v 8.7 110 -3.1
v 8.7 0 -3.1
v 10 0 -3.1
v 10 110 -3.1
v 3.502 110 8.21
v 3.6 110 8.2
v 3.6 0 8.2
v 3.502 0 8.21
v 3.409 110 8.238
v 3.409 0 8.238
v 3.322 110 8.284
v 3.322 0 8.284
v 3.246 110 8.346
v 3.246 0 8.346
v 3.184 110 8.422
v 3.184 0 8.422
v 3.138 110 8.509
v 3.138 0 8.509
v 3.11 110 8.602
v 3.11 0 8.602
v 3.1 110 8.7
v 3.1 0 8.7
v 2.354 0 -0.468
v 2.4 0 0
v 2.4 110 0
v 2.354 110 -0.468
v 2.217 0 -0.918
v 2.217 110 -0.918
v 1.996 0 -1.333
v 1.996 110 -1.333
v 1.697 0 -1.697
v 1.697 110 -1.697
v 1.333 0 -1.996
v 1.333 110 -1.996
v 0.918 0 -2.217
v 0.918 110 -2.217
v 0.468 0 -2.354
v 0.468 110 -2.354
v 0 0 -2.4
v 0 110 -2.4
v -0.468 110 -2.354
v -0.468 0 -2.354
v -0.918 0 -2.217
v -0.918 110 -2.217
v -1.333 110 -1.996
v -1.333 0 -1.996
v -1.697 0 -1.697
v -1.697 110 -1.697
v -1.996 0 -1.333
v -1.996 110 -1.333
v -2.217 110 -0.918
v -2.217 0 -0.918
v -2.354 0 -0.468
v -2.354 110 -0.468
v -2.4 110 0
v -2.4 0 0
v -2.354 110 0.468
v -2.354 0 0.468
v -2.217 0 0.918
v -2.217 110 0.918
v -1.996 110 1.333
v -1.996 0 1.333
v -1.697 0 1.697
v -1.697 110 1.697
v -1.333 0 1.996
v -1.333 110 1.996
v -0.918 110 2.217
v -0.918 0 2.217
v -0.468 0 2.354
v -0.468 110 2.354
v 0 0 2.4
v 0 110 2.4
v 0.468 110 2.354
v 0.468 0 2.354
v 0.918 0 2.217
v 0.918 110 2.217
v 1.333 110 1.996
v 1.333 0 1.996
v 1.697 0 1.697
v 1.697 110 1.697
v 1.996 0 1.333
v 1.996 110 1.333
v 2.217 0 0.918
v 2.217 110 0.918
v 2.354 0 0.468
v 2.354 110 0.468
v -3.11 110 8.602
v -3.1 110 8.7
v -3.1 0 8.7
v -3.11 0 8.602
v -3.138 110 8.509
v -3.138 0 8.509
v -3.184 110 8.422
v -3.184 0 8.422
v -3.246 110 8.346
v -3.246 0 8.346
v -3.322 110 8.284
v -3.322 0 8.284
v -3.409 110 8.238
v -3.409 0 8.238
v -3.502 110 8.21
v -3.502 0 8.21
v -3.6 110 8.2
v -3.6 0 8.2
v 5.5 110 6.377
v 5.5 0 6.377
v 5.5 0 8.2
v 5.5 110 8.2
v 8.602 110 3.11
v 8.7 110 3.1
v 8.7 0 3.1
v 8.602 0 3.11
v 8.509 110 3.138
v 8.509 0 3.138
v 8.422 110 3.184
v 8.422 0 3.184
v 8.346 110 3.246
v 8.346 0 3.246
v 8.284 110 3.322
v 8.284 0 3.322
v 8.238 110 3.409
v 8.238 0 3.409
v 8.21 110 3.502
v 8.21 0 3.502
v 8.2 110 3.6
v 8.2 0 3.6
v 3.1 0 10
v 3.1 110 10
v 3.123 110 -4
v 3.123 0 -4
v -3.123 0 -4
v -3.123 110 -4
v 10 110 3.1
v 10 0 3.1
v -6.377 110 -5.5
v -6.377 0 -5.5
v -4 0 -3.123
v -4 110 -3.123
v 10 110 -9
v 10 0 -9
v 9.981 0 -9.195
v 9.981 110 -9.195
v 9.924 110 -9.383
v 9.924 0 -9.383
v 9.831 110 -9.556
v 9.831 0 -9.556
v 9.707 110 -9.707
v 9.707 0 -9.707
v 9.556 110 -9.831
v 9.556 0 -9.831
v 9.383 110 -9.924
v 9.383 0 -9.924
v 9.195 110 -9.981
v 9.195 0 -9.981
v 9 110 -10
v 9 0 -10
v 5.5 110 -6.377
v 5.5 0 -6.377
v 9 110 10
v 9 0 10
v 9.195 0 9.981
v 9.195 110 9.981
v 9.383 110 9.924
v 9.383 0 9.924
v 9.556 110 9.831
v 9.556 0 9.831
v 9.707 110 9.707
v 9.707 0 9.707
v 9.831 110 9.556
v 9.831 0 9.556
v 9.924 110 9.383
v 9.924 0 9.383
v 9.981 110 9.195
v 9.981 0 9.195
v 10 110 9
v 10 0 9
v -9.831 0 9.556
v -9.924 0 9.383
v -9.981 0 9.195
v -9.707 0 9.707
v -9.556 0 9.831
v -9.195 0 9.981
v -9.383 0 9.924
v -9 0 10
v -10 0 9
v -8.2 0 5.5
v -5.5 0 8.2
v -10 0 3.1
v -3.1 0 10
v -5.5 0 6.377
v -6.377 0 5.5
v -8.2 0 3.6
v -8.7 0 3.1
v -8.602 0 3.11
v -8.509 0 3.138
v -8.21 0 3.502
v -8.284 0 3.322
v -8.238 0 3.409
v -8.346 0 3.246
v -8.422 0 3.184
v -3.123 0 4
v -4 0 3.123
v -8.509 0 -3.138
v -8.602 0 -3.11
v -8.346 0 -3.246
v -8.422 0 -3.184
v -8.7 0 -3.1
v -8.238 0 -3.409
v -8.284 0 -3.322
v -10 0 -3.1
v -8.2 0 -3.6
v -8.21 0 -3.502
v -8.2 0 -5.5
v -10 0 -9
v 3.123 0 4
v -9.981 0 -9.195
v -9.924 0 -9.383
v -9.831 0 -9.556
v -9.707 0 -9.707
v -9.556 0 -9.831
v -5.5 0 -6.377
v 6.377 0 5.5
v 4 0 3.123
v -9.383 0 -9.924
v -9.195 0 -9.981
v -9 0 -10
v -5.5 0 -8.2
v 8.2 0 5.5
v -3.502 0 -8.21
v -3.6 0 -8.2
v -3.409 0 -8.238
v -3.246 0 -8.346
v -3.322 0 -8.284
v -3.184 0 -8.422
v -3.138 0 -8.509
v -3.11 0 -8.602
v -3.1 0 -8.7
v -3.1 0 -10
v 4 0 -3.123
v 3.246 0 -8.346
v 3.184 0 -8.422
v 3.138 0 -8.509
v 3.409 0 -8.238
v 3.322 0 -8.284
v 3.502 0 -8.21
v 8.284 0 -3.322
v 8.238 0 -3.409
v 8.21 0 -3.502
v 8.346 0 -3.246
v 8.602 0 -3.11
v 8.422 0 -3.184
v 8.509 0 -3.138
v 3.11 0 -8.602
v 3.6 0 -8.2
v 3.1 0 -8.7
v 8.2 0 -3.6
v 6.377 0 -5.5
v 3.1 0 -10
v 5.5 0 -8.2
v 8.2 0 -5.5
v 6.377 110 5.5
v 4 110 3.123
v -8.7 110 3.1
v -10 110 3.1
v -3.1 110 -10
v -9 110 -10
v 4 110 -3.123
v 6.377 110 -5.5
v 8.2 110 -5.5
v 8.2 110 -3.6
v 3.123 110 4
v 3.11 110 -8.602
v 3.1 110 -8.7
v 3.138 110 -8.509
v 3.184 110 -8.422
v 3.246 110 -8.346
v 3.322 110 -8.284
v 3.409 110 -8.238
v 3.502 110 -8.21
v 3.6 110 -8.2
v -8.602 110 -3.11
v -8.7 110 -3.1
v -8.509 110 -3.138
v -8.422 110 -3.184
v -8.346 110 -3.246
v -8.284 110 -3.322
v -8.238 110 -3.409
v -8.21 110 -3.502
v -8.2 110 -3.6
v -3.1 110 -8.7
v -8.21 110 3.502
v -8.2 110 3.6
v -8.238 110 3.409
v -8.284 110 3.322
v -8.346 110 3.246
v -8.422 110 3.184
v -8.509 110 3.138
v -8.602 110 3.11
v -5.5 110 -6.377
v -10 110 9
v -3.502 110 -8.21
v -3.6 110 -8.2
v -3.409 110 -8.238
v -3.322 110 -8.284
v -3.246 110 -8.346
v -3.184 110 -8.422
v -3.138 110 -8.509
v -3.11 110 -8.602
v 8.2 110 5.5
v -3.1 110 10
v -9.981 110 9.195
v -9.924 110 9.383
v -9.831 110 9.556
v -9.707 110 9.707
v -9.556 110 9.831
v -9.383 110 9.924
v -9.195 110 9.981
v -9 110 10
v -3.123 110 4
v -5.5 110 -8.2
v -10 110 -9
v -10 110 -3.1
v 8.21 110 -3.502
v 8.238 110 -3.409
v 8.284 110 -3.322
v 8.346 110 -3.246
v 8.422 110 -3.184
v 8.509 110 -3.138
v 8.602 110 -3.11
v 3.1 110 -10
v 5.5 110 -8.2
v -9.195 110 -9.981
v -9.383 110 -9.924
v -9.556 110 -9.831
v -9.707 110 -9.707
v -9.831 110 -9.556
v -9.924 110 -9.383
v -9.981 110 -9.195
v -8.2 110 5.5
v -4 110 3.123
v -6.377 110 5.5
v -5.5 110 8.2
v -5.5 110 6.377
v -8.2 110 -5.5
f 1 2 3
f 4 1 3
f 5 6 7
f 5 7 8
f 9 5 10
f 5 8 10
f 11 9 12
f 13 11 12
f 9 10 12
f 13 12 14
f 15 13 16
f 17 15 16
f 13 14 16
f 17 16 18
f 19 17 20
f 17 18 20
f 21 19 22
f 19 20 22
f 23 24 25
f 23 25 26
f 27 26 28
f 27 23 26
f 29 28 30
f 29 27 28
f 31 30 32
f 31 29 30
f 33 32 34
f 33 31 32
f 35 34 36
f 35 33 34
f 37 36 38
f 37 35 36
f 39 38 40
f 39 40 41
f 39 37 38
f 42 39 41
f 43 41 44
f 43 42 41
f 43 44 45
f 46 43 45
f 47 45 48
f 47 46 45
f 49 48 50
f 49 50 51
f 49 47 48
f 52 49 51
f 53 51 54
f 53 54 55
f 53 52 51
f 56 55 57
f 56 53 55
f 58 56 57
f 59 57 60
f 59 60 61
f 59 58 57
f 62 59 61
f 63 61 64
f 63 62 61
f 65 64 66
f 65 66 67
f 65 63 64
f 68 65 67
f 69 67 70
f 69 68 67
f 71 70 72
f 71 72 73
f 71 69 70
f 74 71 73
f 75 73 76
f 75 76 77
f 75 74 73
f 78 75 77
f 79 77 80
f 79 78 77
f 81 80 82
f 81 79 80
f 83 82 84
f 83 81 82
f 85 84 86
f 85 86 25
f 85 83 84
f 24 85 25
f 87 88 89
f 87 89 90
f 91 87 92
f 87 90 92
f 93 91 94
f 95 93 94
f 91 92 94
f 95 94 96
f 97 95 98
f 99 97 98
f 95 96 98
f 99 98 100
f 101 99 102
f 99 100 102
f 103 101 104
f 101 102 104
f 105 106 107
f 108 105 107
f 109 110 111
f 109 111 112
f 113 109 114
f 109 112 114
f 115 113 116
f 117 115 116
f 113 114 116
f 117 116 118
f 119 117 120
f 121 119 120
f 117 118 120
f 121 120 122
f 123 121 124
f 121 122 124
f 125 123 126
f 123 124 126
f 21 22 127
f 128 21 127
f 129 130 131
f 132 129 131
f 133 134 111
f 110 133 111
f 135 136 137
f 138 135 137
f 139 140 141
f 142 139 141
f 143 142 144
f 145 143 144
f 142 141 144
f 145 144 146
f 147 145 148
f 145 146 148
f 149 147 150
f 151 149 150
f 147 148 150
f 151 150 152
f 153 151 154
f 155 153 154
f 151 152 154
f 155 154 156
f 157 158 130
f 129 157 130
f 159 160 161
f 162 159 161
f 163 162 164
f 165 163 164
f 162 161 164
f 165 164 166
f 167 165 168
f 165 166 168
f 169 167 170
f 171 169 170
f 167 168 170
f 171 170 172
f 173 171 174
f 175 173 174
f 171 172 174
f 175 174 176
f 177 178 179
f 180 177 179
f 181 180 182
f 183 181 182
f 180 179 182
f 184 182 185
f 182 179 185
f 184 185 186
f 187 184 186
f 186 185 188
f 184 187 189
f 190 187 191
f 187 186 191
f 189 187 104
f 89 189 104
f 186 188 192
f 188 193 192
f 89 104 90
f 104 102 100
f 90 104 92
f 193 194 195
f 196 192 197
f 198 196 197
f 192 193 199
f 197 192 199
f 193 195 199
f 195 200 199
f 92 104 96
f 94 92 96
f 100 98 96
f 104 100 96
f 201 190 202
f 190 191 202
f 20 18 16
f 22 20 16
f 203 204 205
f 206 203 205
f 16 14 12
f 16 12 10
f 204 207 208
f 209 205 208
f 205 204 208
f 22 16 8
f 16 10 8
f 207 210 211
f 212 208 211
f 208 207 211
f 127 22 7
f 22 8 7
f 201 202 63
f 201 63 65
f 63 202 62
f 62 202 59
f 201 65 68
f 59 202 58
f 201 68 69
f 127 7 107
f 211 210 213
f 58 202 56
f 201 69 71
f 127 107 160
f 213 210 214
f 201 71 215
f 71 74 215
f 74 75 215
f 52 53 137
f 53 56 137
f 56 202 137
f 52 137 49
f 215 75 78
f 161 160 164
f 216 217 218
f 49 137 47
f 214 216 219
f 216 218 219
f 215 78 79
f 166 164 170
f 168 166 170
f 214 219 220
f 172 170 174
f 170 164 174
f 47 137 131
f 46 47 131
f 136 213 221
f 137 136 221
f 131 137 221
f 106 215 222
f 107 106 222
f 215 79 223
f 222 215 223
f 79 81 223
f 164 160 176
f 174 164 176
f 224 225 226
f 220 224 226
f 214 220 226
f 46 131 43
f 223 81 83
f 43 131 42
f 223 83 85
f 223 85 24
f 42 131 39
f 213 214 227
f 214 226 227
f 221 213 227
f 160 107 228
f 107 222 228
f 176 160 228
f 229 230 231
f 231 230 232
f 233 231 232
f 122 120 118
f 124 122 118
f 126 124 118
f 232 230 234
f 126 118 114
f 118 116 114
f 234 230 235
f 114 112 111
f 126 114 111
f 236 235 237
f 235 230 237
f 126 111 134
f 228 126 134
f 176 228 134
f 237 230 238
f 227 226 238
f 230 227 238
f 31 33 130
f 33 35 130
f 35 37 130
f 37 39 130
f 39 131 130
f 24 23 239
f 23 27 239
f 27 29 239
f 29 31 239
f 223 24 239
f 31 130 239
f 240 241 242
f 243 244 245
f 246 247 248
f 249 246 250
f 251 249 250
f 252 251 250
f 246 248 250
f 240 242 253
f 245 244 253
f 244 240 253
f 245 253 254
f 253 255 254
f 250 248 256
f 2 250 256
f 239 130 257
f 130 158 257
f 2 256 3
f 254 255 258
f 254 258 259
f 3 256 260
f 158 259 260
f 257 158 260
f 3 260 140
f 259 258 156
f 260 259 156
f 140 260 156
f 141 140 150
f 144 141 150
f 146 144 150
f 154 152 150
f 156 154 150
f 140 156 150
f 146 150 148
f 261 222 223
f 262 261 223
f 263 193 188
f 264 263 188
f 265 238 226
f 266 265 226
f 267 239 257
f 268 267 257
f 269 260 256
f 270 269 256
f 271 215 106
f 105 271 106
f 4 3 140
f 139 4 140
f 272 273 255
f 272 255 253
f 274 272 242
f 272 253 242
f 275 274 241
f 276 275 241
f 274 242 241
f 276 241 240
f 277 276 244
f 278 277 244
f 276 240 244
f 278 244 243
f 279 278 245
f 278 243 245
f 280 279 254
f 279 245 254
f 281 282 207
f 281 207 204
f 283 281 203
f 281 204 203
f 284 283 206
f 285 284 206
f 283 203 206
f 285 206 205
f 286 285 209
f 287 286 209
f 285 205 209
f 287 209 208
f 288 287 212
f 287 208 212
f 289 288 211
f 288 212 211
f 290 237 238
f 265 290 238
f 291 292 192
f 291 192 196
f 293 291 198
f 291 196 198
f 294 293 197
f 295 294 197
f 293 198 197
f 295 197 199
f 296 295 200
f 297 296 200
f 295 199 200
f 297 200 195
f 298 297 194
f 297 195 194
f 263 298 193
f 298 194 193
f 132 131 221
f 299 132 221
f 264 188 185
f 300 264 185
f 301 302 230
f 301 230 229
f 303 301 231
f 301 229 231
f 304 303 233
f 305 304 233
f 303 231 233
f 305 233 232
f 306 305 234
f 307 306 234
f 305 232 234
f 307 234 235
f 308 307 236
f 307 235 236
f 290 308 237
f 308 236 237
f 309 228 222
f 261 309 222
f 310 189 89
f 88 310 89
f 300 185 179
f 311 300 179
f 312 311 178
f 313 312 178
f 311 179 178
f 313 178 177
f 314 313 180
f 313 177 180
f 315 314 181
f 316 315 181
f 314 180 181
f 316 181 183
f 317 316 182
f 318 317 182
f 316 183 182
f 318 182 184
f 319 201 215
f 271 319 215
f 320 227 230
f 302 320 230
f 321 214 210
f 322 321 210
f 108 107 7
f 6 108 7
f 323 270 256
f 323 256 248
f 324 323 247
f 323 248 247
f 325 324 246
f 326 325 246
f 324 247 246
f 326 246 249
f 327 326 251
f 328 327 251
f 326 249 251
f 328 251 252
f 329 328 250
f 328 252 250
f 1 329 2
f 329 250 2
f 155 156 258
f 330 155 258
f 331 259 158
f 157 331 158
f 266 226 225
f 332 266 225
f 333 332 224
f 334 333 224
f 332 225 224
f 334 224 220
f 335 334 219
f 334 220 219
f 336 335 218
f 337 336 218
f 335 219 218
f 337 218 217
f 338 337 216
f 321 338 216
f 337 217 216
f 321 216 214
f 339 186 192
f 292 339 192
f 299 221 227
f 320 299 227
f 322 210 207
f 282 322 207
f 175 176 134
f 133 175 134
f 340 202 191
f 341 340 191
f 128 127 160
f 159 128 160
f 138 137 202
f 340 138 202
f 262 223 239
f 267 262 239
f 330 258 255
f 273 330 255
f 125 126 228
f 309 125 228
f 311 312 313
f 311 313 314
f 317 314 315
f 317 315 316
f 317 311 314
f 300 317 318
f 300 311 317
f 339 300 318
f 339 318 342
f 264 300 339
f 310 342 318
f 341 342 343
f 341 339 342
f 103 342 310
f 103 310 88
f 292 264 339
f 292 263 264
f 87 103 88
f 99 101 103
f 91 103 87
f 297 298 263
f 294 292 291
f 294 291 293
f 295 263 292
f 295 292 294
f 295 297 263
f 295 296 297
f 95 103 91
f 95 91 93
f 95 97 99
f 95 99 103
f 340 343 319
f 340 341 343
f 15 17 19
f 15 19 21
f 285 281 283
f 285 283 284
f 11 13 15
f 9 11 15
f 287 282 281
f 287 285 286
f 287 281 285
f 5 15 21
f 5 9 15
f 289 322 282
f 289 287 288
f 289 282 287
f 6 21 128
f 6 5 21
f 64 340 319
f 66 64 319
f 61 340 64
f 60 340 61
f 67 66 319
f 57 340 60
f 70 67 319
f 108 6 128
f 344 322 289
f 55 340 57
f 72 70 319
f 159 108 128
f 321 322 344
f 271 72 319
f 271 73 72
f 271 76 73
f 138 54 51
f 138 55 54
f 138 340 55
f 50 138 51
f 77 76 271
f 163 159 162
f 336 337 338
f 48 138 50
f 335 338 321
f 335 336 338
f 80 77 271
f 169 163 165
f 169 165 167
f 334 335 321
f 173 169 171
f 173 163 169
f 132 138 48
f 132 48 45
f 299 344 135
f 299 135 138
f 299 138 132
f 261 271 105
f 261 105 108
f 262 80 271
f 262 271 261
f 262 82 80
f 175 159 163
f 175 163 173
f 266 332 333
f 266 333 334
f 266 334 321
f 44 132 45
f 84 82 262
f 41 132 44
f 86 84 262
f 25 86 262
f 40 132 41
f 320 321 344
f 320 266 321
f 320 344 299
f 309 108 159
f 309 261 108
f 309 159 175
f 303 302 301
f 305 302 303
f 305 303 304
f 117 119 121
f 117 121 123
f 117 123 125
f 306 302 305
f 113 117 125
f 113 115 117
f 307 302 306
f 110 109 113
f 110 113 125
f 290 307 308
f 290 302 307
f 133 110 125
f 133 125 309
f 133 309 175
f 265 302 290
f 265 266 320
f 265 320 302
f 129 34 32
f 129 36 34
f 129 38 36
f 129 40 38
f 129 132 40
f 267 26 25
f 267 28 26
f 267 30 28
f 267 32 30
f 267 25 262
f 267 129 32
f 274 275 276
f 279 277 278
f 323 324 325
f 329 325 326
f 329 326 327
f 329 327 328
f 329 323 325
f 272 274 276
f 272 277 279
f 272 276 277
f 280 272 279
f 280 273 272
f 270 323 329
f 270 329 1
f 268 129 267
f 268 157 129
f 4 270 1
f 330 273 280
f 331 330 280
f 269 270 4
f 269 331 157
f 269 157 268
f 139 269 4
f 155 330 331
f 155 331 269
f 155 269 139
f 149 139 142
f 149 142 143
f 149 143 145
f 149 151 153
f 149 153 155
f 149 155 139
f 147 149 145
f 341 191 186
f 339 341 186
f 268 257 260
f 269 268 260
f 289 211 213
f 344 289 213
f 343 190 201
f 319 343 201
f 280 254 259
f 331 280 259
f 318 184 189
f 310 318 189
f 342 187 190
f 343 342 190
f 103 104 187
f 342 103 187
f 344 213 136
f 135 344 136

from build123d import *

# Parameters (mm, degrees)
SKETCH1_R           = 2.4
BOSS_EXTRUDE1_DEPTH = 110


with BuildPart() as part:
    # Sketch1 → Boss-Extrude1 (new body)
    with BuildSketch(Plane(origin=(0, 0, 0), x_dir=(1, 0, 0), z_dir=(0, 1, 0))):
        with BuildLine():
            ThreePointArc((-10, -9), (-9.707106781, -9.707106781), (-9, -10))
            Line((-9, -10), (-3.1, -10))
            Line((-3.1, -10), (-3.1, -8.7))
            ThreePointArc((-3.1, -8.7), (-3.246446609, -8.346446609), (-3.6, -8.2))
            Line((-3.6, -8.2), (-5.5, -8.2))
            Line((-5.5, -8.2), (-5.5, -6.376528763))
            Line((-5.5, -6.376528763), (-3.123471237, -4))
            Line((-3.123471237, -4), (0, -4))
            Line((0, -4), (3.123471237, -4))
            Line((3.123471237, -4), (5.5, -6.376528763))
            Line((5.5, -6.376528763), (5.5, -8.2))
            Line((5.5, -8.2), (3.6, -8.2))
            ThreePointArc((3.6, -8.2), (3.246446609, -8.346446609), (3.1, -8.7))
            Line((3.1, -8.7), (3.1, -10))
            Line((3.1, -10), (9, -10))
            ThreePointArc((9, -10), (9.707106781, -9.707106781), (10, -9))
            Line((10, -9), (10, -3.1))
            Line((10, -3.1), (8.7, -3.1))
            ThreePointArc((8.7, -3.1), (8.346446609, -3.246446609), (8.2, -3.6))
            Line((8.2, -3.6), (8.2, -5.5))
            Line((8.2, -5.5), (6.376528763, -5.5))
            Line((6.376528763, -5.5), (4, -3.123471237))
            Line((4, -3.123471237), (4, 0))
            Line((4, 0), (4, 3.123471237))
            Line((4, 3.123471237), (6.376528763, 5.5))
            Line((6.376528763, 5.5), (8.2, 5.5))
            Line((8.2, 5.5), (8.2, 3.6))
            ThreePointArc((8.2, 3.6), (8.346446609, 3.246446609), (8.7, 3.1))
            Line((8.7, 3.1), (10, 3.1))
            Line((10, 3.1), (10, 9))
            ThreePointArc((10, 9), (9.707106781, 9.707106781), (9, 10))
            Line((9, 10), (3.1, 10))
            Line((3.1, 10), (3.1, 8.7))
            ThreePointArc((3.1, 8.7), (3.246446609, 8.346446609), (3.6, 8.2))
            Line((3.6, 8.2), (5.5, 8.2))
            Line((5.5, 8.2), (5.5, 6.376528763))
            Line((5.5, 6.376528763), (3.123471237, 4))
            Line((3.123471237, 4), (0, 4))
            Line((0, 4), (-3.123471237, 4))
            Line((-3.123471237, 4), (-5.5, 6.376528763))
            Line((-5.5, 6.376528763), (-5.5, 8.2))
            Line((-5.5, 8.2), (-3.6, 8.2))
            ThreePointArc((-3.6, 8.2), (-3.246446609, 8.346446609), (-3.1, 8.7))
            Line((-3.1, 8.7), (-3.1, 10))
            Line((-3.1, 10), (-9, 10))
            ThreePointArc((-9, 10), (-9.707106781, 9.707106781), (-10, 9))
            Line((-10, 9), (-10, 3.1))
            Line((-10, 3.1), (-8.7, 3.1))
            ThreePointArc((-8.7, 3.1), (-8.346446609, 3.246446609), (-8.2, 3.6))
            Line((-8.2, 3.6), (-8.2, 5.5))
            Line((-8.2, 5.5), (-6.376528763, 5.5))
            Line((-6.376528763, 5.5), (-4, 3.123471237))
            Line((-4, 3.123471237), (-4, 0))
            Line((-4, 0), (-4, -3.123471237))
            Line((-4, -3.123471237), (-6.376528763, -5.5))
            Line((-6.376528763, -5.5), (-8.2, -5.5))
            Line((-8.2, -5.5), (-8.2, -3.6))
            ThreePointArc((-8.2, -3.6), (-8.346446609, -3.246446609), (-8.7, -3.1))
            Line((-8.7, -3.1), (-10, -3.1))
            Line((-10, -3.1), (-10, -9))
        make_face()
        Circle(SKETCH1_R, mode=Mode.SUBTRACT)
    extrude(amount=BOSS_EXTRUDE1_DEPTH)


solid = part.part
